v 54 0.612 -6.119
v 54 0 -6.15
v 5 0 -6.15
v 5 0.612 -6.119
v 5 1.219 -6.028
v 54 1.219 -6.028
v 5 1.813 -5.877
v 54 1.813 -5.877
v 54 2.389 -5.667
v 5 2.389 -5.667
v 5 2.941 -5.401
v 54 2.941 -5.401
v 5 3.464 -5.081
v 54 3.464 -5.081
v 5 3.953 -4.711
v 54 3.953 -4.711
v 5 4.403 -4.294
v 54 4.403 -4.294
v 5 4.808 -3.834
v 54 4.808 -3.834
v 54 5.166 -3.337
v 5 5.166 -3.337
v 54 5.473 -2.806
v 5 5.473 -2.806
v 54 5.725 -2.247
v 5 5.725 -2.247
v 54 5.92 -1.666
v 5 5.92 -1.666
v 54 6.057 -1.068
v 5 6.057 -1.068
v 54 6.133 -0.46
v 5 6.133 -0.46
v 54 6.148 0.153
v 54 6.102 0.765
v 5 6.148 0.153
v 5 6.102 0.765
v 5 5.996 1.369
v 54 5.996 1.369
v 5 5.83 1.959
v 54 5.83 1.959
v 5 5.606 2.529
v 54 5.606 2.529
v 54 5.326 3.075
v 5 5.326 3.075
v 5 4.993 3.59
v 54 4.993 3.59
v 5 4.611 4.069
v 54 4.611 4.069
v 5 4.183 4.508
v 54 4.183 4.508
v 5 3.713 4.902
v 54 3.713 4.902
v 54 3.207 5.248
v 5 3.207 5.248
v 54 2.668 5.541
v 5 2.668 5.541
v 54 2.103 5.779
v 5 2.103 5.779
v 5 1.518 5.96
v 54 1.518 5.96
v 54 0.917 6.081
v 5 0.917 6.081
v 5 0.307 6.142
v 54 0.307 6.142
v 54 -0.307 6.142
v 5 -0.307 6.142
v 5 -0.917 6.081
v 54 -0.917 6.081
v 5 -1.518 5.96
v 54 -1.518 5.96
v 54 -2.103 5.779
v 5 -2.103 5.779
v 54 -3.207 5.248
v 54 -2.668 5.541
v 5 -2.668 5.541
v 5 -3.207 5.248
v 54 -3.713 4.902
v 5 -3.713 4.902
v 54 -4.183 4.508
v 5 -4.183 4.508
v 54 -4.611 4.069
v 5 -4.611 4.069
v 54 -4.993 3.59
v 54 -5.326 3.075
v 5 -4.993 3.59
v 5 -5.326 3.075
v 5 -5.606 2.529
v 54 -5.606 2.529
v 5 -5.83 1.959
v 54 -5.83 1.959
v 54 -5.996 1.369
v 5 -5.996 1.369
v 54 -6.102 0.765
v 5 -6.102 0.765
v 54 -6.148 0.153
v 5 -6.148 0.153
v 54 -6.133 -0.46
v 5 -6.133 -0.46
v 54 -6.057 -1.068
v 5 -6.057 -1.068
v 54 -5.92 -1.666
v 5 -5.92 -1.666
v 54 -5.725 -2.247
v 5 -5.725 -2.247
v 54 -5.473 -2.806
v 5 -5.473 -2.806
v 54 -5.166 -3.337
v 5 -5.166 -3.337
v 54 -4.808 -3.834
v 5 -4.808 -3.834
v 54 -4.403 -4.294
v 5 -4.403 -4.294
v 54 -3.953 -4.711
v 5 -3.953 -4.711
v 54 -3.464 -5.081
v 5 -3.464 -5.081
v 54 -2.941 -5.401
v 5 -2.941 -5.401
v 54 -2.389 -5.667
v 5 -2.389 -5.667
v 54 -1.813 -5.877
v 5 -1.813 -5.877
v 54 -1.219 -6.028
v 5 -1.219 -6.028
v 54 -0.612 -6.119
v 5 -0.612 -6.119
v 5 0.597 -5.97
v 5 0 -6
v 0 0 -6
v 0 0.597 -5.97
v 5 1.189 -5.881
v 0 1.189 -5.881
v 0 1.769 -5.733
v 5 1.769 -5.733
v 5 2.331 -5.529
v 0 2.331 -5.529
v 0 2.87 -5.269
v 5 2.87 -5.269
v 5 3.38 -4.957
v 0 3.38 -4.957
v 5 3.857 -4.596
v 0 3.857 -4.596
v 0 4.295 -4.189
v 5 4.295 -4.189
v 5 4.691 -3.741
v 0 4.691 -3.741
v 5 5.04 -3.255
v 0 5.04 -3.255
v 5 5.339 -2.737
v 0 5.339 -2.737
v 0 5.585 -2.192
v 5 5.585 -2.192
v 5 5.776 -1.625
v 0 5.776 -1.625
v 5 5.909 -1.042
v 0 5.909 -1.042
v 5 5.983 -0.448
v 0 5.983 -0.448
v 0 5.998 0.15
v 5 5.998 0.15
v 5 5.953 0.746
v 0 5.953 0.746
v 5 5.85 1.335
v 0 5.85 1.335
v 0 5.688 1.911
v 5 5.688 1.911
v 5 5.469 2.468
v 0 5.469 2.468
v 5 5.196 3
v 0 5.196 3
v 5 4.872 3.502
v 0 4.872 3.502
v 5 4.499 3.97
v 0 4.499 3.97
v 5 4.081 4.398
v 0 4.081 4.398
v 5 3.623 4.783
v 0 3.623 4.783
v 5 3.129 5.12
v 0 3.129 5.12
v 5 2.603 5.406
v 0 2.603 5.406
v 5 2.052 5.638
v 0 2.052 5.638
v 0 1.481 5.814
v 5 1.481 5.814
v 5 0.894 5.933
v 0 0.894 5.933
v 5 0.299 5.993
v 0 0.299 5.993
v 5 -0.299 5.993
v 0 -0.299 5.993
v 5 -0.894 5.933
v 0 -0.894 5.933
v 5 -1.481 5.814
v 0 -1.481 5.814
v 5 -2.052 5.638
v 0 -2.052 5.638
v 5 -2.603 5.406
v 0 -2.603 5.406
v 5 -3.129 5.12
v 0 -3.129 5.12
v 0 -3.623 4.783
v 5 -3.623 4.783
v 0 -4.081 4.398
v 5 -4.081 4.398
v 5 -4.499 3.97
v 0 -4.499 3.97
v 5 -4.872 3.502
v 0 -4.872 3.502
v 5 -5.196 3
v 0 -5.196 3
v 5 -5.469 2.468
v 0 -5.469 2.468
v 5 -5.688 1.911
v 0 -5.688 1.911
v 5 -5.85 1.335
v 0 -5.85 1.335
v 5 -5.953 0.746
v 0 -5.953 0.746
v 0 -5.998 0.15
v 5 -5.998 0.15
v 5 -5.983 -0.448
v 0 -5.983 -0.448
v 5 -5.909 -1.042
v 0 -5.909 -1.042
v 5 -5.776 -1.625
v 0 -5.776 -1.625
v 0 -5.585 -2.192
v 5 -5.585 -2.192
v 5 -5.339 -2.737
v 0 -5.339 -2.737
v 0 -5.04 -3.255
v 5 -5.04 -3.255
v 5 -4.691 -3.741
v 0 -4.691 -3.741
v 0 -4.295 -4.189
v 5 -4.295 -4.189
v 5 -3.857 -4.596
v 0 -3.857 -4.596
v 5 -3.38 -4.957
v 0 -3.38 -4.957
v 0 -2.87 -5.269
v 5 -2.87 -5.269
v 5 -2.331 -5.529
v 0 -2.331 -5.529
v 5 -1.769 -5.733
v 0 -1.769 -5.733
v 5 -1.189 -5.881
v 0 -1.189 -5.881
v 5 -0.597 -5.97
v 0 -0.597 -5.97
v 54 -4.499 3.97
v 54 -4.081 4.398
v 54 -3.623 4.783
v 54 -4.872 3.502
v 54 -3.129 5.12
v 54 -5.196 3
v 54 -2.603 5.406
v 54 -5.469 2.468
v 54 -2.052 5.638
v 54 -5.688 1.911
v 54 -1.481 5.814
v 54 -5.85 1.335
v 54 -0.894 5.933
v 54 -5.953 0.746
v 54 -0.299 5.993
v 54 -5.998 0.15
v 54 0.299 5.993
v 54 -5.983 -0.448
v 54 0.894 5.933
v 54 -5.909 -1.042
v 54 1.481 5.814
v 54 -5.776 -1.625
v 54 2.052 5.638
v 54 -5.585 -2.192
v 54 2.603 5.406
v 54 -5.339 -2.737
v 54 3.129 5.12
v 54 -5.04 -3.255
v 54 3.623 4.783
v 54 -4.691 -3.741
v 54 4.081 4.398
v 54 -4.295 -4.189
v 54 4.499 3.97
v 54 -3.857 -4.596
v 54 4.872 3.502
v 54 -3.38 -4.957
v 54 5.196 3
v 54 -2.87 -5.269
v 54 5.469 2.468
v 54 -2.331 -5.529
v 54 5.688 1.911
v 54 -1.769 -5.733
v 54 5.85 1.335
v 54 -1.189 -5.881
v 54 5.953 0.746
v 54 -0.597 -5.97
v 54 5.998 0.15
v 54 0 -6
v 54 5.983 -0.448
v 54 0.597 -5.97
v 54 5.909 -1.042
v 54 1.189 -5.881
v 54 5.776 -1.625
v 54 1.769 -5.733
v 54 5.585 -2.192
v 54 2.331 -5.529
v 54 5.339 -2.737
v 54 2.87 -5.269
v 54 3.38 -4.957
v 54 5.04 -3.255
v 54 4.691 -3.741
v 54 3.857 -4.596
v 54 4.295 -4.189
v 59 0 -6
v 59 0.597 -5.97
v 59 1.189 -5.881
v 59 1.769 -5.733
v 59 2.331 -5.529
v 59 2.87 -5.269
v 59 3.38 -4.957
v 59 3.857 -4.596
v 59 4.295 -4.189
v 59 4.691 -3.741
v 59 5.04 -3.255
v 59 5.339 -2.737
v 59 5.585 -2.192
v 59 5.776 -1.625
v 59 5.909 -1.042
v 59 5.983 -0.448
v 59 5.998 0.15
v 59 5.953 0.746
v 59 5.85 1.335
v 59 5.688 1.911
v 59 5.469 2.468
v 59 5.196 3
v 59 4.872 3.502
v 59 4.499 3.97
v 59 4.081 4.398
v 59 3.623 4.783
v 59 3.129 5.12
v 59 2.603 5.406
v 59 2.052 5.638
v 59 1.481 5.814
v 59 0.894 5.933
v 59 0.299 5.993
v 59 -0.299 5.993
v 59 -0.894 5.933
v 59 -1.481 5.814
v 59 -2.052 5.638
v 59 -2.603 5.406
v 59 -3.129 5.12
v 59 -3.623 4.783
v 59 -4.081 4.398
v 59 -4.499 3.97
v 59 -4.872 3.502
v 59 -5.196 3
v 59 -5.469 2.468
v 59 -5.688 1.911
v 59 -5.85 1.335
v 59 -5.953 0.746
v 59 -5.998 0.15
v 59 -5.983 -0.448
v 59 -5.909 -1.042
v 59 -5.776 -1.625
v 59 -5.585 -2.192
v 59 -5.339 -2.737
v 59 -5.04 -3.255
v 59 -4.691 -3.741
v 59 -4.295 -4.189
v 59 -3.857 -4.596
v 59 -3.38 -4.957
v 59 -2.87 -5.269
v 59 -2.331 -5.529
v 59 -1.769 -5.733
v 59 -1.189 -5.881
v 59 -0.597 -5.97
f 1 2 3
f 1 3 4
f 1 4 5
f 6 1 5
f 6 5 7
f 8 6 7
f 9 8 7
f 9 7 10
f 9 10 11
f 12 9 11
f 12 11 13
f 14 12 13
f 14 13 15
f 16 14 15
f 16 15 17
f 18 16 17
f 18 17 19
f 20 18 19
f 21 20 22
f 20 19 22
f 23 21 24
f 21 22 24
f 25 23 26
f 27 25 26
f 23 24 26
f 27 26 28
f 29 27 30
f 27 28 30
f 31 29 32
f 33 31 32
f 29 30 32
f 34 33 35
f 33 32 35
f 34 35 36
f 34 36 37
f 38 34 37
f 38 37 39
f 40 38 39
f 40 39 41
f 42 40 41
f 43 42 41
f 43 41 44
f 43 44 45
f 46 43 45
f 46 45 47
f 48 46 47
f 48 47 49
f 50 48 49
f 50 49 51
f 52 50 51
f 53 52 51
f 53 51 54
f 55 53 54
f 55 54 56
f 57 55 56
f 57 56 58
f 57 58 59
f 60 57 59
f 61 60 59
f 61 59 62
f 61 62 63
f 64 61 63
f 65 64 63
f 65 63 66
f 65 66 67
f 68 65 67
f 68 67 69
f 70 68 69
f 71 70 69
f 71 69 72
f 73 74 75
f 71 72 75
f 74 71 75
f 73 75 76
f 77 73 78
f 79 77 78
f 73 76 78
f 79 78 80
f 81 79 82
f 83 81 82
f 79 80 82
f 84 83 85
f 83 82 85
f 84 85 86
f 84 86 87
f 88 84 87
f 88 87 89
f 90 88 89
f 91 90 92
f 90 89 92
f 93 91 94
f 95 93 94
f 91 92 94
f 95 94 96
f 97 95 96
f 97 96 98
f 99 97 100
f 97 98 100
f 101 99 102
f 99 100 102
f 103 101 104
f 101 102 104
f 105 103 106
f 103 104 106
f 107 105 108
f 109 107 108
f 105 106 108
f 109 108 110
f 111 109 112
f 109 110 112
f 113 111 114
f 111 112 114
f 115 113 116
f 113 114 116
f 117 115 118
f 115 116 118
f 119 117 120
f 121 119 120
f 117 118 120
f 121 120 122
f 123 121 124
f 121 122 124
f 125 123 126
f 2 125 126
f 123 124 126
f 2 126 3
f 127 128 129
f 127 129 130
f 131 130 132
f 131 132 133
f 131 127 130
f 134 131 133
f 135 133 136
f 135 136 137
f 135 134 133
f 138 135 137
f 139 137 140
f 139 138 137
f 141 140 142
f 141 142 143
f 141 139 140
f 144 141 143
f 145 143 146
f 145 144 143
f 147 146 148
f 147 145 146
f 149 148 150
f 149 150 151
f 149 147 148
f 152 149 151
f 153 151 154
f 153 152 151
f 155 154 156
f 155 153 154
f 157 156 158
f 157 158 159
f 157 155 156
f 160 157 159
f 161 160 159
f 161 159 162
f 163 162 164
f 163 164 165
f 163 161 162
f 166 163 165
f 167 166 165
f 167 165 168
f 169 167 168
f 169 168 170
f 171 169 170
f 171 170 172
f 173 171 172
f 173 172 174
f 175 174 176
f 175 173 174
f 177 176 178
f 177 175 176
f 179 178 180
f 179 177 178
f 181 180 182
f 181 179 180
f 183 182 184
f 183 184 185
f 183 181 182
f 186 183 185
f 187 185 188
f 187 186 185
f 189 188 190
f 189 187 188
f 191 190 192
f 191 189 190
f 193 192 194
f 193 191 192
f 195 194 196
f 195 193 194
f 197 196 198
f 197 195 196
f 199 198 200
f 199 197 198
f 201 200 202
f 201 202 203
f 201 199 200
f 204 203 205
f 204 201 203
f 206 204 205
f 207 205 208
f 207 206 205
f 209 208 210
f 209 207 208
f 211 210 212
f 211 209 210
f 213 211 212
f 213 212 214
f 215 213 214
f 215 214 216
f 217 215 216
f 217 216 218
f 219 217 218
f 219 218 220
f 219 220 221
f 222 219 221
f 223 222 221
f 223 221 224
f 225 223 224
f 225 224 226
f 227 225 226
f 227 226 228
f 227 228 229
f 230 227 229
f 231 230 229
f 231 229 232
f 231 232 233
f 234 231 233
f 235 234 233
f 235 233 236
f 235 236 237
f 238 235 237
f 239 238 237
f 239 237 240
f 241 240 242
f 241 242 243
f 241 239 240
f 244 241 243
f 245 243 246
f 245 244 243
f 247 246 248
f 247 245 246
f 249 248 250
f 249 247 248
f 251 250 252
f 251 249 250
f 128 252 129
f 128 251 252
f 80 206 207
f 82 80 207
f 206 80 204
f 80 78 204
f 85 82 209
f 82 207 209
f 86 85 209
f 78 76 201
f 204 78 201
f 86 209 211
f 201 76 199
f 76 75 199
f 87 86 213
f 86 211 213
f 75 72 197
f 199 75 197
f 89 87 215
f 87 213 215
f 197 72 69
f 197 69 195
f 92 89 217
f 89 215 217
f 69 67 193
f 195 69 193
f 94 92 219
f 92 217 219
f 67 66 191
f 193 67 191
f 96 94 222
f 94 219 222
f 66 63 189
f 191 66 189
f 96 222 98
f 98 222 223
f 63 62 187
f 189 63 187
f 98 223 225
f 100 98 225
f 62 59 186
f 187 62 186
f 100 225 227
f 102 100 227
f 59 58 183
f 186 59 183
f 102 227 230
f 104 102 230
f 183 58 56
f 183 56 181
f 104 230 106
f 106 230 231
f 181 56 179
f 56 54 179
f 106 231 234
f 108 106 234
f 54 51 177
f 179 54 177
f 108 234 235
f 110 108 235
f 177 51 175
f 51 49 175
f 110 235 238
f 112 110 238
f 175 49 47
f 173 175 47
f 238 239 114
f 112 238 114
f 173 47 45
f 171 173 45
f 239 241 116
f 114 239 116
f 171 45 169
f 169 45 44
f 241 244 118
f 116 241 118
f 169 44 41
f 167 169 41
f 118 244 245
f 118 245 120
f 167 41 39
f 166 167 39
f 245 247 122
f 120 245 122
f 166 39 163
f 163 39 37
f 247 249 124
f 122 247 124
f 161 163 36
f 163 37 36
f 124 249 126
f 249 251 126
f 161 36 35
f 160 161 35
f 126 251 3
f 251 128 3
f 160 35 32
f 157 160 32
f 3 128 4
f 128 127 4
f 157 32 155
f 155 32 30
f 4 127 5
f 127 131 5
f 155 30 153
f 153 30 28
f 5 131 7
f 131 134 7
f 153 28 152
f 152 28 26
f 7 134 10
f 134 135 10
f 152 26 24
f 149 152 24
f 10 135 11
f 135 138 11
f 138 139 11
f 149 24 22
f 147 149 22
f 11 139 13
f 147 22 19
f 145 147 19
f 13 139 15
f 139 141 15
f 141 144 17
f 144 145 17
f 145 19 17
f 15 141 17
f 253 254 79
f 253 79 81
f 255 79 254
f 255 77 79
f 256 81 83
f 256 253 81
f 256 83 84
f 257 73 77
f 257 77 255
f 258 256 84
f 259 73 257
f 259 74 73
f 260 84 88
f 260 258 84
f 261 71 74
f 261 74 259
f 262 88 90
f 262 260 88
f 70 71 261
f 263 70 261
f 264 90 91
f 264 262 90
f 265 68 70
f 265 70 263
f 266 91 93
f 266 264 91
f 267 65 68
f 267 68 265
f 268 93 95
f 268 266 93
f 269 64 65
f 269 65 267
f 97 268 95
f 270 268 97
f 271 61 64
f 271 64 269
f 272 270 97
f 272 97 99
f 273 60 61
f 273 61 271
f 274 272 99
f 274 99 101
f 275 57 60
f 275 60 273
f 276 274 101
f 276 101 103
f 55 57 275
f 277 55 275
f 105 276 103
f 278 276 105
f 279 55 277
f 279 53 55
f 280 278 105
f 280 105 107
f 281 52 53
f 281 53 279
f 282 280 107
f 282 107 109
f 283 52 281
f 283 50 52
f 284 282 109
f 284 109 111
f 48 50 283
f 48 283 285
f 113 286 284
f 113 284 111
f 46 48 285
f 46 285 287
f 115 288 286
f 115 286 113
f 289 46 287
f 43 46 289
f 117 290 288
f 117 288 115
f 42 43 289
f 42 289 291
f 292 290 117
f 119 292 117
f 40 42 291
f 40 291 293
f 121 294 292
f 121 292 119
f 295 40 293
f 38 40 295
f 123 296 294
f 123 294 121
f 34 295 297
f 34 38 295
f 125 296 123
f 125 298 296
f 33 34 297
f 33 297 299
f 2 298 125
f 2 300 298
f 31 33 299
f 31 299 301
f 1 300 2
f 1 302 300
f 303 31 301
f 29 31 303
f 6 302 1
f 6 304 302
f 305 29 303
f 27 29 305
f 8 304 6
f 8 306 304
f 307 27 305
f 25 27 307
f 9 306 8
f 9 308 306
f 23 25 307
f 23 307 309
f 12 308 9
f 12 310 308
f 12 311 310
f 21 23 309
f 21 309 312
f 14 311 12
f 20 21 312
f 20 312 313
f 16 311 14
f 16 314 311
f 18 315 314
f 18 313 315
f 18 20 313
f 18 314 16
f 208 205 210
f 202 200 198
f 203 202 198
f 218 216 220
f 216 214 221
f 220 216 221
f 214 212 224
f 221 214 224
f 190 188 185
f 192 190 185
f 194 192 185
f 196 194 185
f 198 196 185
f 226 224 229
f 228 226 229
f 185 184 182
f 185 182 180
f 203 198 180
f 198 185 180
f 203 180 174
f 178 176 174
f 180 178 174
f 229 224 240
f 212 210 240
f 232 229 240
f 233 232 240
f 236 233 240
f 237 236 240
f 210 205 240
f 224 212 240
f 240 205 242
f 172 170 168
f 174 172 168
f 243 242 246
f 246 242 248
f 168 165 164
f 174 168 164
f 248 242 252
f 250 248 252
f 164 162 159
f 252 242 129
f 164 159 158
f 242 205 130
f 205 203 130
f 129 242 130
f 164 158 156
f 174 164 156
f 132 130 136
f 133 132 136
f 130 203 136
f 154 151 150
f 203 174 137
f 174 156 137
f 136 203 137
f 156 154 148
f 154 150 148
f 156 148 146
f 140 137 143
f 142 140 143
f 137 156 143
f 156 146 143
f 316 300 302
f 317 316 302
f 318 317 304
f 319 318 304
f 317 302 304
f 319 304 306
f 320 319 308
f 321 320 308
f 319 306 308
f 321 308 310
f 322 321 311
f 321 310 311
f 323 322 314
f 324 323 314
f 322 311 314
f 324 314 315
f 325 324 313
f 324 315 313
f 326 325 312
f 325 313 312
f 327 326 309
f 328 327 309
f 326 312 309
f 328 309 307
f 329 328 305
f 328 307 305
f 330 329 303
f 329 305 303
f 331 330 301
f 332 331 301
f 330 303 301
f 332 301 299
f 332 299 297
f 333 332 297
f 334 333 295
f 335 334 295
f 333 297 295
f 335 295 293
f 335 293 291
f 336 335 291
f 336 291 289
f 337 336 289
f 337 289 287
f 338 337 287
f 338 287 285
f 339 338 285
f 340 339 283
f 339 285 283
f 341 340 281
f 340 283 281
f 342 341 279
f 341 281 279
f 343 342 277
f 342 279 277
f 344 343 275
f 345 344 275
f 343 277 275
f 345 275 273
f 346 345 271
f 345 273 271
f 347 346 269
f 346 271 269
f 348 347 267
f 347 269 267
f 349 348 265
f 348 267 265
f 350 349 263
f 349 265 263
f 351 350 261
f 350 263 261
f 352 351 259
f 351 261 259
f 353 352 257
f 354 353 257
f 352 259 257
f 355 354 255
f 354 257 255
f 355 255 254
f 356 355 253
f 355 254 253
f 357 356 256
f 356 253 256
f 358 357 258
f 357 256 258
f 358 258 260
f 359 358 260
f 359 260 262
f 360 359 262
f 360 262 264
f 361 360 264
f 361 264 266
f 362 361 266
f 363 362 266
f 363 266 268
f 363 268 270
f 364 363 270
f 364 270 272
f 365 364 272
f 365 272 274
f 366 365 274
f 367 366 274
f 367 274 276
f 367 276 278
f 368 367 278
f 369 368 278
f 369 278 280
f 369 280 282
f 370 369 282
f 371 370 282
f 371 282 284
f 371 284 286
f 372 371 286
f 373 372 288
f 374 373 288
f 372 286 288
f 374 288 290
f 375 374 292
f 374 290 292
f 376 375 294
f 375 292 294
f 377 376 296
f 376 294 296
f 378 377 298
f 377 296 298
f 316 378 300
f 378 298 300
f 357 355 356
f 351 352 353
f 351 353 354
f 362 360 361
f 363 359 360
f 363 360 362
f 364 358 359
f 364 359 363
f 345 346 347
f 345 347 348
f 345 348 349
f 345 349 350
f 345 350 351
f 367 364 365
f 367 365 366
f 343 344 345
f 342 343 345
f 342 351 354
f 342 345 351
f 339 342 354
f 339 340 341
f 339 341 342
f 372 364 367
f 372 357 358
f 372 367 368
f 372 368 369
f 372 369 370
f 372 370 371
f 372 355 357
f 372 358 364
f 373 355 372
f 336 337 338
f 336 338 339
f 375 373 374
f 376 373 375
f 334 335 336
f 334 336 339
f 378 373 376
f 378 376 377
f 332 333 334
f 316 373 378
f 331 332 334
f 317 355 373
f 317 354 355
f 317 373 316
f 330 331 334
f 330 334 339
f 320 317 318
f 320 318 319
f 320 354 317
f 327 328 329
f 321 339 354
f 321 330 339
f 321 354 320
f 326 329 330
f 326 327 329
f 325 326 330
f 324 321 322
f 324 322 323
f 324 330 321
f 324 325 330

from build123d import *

# Parameters (mm, degrees)
SKETCH1_R           = 6.15
BOSS_EXTRUDE1_DEPTH = 59
CUT_EXTRUDE1_START  = -5
SKETCH2_R           = 6.15
SKETCH2_R_2         = 6
CUT_EXTRUDE1_DEPTH  = 5


with BuildPart() as part:
    # Sketch1 → Boss-Extrude1 (new body)
    with BuildSketch(Plane(origin=(0, 0, 0), x_dir=(0, 0, -1), z_dir=(1, 0, 0))):
        Circle(SKETCH1_R)
    extrude(amount=BOSS_EXTRUDE1_DEPTH)

    # Sketch2 → Cut-Extrude1 (cut)
    with BuildSketch(Plane(origin=(59, 0, 0), x_dir=(0, 0, -1), z_dir=(1, 0, 0)).offset(CUT_EXTRUDE1_START)):
        Circle(SKETCH2_R)
        Circle(SKETCH2_R_2, mode=Mode.SUBTRACT)
    cut_extrude1 = extrude(amount=CUT_EXTRUDE1_DEPTH, mode=Mode.SUBTRACT)

    # Mirror1: Cut-Extrude1 across plane
    add(cut_extrude1.mirror(Plane(origin=(29.5, 0, 0), x_dir=(0, 0, 1), z_dir=(1, 0, 0))), mode=Mode.SUBTRACT)


solid = part.part
